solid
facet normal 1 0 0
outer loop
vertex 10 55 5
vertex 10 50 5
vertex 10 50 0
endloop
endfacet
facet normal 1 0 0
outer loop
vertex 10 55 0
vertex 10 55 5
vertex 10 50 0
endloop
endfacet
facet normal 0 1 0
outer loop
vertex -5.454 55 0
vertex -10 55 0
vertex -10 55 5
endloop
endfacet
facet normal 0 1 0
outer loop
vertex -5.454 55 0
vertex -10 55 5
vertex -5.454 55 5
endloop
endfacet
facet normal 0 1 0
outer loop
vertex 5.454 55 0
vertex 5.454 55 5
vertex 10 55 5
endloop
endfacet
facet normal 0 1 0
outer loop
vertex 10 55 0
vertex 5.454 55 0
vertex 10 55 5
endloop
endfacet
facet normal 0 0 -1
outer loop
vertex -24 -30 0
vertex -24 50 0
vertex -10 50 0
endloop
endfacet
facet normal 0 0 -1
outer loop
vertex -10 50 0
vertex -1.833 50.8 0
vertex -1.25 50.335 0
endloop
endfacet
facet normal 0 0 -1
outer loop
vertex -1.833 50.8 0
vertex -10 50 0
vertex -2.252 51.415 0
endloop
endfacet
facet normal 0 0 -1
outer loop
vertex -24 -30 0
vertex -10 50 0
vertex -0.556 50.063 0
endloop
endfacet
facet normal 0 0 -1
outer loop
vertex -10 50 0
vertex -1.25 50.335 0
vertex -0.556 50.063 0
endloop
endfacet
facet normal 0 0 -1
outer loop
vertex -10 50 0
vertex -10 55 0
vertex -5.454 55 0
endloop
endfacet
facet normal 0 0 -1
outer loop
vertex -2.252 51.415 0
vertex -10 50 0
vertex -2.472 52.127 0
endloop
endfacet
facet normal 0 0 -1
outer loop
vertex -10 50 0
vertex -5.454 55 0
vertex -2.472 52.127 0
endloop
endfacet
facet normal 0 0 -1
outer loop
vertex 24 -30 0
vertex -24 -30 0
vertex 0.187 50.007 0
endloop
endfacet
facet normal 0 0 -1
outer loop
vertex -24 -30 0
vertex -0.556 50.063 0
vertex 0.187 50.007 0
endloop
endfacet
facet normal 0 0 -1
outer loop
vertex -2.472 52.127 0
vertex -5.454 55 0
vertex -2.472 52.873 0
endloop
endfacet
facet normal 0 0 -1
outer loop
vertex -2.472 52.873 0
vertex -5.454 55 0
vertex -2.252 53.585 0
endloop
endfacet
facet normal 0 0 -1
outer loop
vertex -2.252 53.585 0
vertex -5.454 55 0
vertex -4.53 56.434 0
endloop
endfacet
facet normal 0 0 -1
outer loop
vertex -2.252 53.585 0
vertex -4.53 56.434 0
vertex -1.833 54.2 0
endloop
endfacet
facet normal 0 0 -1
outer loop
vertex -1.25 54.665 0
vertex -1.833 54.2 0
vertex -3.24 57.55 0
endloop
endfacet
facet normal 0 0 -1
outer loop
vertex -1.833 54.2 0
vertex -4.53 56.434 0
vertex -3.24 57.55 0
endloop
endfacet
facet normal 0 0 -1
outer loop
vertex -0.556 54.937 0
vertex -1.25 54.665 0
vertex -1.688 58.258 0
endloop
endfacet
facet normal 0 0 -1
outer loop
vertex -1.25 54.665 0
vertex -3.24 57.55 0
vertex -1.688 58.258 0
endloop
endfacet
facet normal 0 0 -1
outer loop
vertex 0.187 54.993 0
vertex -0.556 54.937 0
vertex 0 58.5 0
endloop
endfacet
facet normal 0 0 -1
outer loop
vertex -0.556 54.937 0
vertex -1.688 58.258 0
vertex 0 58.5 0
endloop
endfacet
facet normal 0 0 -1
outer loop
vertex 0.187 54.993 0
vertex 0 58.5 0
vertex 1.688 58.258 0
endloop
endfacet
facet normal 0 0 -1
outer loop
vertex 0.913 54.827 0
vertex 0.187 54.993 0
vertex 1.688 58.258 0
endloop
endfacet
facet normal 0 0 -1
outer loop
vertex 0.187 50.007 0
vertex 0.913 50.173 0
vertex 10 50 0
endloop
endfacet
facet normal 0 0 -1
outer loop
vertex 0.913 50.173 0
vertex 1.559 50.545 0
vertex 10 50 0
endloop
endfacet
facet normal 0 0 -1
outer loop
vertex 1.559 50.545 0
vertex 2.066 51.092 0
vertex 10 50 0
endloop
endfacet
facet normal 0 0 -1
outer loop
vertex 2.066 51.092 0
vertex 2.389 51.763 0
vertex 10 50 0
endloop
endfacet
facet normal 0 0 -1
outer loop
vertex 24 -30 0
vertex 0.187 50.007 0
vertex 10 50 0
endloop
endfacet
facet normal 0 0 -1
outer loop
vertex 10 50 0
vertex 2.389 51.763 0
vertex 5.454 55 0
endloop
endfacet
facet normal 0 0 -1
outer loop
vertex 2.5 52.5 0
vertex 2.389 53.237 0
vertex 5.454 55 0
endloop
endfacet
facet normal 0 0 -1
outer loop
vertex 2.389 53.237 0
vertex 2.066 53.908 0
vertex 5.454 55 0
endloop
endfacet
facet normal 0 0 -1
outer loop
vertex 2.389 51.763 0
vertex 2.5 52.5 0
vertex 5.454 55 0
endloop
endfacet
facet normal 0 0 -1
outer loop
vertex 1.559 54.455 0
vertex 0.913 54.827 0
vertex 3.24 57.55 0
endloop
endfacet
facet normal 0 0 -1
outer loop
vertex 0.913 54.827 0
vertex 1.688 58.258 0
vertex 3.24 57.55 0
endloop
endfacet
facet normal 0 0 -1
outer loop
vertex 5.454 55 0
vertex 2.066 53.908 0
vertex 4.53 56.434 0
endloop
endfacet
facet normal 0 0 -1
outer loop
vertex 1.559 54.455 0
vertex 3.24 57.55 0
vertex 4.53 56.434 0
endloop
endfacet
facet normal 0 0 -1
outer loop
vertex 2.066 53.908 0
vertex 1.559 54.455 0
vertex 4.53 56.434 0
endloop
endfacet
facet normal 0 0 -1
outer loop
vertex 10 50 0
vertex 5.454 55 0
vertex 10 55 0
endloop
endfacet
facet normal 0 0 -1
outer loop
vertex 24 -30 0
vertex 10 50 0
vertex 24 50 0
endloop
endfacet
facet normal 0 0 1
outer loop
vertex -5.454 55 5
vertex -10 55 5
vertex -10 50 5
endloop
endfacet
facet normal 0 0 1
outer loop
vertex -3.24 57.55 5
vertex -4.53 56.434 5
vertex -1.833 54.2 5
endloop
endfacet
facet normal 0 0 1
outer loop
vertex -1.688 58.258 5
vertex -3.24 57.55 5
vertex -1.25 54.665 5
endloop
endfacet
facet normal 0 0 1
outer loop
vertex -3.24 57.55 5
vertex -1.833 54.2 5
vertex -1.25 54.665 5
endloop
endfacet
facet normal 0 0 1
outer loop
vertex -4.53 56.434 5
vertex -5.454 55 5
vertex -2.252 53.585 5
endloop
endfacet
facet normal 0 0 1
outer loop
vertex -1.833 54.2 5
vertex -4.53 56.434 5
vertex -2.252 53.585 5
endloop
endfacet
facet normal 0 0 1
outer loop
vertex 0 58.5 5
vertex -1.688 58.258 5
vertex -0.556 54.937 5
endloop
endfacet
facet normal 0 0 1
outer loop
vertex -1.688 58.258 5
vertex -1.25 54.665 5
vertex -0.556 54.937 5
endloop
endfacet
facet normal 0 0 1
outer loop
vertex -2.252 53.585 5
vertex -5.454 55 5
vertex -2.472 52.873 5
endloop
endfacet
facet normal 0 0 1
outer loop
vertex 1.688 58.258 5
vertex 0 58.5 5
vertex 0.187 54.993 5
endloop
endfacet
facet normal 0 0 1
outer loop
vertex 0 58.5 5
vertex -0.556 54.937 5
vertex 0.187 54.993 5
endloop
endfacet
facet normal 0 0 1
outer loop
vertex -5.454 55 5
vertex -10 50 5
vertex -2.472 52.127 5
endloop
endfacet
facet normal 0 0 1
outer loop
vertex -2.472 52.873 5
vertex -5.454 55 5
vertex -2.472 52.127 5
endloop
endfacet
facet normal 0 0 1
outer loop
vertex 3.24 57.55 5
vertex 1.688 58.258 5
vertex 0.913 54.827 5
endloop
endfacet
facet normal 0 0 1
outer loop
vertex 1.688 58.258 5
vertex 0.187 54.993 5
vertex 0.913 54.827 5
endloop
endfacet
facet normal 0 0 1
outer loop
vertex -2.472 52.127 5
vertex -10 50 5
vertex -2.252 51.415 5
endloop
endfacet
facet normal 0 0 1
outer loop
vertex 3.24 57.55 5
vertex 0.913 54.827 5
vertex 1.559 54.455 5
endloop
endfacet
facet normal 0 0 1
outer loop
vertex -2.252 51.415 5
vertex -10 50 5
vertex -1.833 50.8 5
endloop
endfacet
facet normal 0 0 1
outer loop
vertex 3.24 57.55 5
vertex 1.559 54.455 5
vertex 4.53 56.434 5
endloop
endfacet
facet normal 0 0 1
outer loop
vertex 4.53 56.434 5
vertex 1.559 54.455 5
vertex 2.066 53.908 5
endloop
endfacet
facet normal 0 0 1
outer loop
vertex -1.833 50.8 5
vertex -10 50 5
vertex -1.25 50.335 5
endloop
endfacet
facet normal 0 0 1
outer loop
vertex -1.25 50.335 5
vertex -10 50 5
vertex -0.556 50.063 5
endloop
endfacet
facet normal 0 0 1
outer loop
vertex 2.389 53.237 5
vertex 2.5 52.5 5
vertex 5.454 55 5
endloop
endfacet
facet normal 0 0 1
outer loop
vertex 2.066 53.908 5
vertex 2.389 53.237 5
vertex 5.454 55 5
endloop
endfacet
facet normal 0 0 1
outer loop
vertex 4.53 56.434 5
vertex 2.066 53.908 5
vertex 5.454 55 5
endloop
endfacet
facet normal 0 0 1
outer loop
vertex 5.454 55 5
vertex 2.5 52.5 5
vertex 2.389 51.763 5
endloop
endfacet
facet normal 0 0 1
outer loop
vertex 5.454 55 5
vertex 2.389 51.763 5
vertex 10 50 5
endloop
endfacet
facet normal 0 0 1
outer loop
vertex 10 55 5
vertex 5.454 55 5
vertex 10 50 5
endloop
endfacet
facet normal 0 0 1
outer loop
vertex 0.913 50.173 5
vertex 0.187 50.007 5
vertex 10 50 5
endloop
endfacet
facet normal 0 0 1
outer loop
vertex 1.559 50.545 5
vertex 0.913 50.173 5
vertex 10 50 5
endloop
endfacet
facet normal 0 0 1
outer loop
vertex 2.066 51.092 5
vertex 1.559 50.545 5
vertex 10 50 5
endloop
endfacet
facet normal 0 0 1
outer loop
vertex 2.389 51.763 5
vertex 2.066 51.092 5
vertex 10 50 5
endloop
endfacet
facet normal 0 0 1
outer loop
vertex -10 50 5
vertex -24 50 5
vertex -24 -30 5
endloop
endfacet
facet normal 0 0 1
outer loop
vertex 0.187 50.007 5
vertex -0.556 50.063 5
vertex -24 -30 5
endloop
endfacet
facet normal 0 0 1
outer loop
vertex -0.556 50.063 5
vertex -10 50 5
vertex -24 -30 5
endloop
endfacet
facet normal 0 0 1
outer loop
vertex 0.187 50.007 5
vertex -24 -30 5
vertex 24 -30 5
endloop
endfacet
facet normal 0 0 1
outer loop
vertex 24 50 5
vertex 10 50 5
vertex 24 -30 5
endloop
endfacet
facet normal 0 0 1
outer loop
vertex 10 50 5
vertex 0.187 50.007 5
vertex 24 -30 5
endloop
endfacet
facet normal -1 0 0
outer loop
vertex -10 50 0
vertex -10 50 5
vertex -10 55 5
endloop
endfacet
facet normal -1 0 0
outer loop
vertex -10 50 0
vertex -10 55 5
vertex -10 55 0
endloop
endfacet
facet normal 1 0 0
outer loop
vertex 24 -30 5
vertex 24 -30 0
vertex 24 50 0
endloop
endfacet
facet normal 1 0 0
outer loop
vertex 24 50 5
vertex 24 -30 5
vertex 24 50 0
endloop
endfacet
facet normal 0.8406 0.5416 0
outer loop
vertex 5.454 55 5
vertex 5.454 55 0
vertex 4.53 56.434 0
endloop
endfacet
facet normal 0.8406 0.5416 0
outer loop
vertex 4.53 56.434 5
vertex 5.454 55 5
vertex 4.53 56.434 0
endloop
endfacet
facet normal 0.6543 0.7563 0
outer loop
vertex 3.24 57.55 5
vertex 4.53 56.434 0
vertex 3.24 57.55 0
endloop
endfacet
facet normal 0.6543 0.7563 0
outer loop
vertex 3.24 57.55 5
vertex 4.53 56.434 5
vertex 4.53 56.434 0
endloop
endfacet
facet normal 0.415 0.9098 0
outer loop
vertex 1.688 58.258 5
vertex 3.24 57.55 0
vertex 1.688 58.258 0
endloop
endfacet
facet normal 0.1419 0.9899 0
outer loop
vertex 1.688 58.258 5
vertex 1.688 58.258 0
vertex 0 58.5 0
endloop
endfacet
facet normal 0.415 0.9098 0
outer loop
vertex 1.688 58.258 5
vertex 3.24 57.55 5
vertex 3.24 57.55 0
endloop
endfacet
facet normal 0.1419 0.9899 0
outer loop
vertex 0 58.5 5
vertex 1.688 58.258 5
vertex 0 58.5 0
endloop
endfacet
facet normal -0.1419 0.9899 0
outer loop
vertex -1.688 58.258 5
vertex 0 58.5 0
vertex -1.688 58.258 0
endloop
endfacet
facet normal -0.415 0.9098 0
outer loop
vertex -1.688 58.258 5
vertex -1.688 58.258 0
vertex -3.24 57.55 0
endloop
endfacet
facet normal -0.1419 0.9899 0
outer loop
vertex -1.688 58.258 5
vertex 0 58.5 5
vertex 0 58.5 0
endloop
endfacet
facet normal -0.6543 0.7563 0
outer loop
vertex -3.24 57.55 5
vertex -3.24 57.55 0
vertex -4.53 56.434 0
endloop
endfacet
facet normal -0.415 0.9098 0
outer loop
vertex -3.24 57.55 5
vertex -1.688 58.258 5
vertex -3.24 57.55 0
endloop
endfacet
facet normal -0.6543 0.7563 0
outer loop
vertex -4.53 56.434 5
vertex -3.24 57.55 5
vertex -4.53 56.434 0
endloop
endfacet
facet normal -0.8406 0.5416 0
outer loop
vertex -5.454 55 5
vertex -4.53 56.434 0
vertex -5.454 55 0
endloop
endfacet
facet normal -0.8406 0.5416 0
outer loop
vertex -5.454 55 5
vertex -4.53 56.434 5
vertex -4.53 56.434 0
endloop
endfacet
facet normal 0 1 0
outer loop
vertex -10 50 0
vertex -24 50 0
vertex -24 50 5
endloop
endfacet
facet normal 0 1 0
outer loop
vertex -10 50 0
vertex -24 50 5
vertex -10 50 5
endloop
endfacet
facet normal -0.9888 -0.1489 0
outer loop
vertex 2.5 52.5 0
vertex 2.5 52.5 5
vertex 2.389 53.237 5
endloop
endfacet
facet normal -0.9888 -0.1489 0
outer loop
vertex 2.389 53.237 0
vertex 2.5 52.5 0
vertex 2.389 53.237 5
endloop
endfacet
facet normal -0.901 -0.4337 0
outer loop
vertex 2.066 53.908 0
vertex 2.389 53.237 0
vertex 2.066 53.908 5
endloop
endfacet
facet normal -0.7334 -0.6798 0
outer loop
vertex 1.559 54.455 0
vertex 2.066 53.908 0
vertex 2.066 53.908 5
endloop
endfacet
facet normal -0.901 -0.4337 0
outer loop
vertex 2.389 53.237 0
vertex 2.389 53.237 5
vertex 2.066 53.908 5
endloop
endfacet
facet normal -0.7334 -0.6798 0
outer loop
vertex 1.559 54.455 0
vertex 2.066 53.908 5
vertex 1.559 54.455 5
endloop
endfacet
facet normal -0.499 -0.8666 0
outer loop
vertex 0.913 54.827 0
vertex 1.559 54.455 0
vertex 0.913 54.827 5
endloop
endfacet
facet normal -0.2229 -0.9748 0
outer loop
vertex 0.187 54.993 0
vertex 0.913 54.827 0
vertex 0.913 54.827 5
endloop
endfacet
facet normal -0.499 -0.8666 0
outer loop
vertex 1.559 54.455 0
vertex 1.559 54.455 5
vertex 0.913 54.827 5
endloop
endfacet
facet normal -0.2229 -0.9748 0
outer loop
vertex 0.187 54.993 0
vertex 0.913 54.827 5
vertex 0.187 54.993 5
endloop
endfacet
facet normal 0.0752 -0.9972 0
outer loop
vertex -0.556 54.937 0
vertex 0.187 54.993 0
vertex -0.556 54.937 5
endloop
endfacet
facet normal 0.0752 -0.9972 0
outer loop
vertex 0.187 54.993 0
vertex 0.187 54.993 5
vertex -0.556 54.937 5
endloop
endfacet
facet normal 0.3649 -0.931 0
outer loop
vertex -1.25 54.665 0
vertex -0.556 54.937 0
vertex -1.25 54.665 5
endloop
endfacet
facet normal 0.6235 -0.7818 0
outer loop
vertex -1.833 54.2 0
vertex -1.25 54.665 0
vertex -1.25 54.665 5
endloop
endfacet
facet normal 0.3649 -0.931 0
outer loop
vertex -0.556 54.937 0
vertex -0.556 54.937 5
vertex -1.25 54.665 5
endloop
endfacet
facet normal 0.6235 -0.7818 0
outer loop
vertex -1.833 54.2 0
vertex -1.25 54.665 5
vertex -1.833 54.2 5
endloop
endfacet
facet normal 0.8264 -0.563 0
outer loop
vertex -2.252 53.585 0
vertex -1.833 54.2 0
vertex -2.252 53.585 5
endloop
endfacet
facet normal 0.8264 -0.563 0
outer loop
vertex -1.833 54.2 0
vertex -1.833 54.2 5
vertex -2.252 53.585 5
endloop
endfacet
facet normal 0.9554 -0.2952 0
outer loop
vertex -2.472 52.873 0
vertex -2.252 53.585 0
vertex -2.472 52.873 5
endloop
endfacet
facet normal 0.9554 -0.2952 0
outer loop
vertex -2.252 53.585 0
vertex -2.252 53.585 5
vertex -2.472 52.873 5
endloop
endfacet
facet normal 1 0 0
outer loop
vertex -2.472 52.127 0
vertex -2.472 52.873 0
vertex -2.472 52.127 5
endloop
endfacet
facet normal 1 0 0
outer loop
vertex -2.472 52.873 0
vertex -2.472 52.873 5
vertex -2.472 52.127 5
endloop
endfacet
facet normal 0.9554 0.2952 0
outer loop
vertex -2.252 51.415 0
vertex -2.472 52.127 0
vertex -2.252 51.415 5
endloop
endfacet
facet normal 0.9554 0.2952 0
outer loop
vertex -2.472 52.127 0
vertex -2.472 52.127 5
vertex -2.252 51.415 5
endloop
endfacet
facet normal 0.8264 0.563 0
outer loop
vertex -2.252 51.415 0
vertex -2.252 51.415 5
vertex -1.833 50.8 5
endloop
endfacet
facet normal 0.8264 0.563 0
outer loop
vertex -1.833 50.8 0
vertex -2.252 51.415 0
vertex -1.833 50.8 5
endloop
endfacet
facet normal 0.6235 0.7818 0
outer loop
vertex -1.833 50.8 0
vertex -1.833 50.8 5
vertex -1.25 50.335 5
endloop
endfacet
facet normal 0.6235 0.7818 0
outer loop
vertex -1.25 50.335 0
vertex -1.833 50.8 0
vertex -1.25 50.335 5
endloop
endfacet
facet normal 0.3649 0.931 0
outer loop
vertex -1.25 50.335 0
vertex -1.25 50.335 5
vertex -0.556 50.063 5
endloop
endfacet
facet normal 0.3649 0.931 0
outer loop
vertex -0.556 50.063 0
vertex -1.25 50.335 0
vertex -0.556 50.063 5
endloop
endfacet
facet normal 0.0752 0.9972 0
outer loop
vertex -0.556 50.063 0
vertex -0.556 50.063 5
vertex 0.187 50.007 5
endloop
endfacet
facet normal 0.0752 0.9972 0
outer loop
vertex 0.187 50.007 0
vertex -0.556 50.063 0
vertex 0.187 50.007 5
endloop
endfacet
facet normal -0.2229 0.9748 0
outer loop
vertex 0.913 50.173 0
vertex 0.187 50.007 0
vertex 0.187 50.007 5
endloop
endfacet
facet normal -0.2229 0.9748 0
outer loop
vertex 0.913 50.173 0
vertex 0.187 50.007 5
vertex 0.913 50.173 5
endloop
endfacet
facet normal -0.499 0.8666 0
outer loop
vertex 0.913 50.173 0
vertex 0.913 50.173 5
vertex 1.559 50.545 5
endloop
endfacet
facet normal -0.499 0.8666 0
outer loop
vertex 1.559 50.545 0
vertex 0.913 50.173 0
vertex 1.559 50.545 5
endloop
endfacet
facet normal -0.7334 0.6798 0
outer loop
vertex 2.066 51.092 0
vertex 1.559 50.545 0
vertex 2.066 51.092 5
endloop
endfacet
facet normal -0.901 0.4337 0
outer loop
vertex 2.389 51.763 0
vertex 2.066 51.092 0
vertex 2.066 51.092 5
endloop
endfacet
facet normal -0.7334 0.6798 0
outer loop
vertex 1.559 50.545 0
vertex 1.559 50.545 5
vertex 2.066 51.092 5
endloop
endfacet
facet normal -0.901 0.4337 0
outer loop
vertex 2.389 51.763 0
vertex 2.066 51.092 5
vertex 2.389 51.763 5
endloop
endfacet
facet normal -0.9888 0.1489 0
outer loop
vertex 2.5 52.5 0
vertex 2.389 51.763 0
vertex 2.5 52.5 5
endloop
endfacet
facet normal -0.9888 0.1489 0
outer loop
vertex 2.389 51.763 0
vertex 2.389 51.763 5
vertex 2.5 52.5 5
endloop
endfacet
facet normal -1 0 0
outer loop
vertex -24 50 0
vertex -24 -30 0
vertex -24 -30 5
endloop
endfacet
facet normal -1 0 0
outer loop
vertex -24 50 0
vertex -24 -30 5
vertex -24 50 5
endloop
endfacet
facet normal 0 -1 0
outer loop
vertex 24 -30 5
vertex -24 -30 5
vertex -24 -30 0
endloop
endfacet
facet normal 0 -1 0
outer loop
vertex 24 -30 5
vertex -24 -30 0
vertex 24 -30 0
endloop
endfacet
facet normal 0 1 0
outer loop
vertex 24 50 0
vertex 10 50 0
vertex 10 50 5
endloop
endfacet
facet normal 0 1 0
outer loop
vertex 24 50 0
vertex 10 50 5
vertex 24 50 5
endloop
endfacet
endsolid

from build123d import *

# Parameters (mm, degrees)
SKETCH1_W           = 48
SKETCH1_H           = 100
BOSS_EXTRUDE1_DEPTH = 5
SKETCH2_W           = 20
SKETCH2_H           = 5
BOSS_EXTRUDE2_DEPTH = 5
SKETCH3_R           = 6
BOSS_EXTRUDE3_DEPTH = 5
SKETCH4_R           = 2.5
CUT_EXTRUDE1_DEPTH  = 5
SKETCH5_W           = 53.859094163
SKETCH5_H           = 28.820783856
CUT_EXTRUDE2_DEPTH  = 10


with BuildPart() as part:
    # Sketch1 → Boss-Extrude1 (new body)
    with BuildSketch(Plane.XY):
        Rectangle(SKETCH1_W, SKETCH1_H)
    extrude(amount=BOSS_EXTRUDE1_DEPTH)

    # Sketch2 → Boss-Extrude2 (add)
    with BuildSketch(Plane(origin=(0, 50, 0), x_dir=(1, 0, 0), z_dir=(0, 1, 0))):
        with Locations((0, -2.5)):
            Rectangle(SKETCH2_W, SKETCH2_H)
    boss_extrude2 = extrude(amount=BOSS_EXTRUDE2_DEPTH)

    # Mirror1: Boss-Extrude2 across plane
    add(boss_extrude2.mirror(Plane.ZX))

    # Sketch3 → Boss-Extrude3 (add)
    with BuildSketch(Plane.XY.offset(5)):
        with Locations((0, 52.5)):
            Circle(SKETCH3_R)
    boss_extrude3 = extrude(amount=-BOSS_EXTRUDE3_DEPTH)

    # Sketch4 → Cut-Extrude1 (cut)
    with BuildSketch(Plane.XY.offset(5)):
        with Locations((0, 52.5)):
            Circle(SKETCH4_R)
    cut_extrude1 = extrude(amount=-CUT_EXTRUDE1_DEPTH, mode=Mode.SUBTRACT)

    # Mirror2: Boss-Extrude3, Cut-Extrude1 across plane
    add(boss_extrude3.mirror(Plane.ZX))
    add(cut_extrude1.mirror(Plane.ZX), mode=Mode.SUBTRACT)

    # Sketch5 → Cut-Extrude2 (cut)
    with BuildSketch(Plane.XY.offset(5)):
        with Locations((2.929547082, -44.410391928)):
            Rectangle(SKETCH5_W, SKETCH5_H)
    extrude(amount=-CUT_EXTRUDE2_DEPTH, mode=Mode.SUBTRACT)


solid = part.part
